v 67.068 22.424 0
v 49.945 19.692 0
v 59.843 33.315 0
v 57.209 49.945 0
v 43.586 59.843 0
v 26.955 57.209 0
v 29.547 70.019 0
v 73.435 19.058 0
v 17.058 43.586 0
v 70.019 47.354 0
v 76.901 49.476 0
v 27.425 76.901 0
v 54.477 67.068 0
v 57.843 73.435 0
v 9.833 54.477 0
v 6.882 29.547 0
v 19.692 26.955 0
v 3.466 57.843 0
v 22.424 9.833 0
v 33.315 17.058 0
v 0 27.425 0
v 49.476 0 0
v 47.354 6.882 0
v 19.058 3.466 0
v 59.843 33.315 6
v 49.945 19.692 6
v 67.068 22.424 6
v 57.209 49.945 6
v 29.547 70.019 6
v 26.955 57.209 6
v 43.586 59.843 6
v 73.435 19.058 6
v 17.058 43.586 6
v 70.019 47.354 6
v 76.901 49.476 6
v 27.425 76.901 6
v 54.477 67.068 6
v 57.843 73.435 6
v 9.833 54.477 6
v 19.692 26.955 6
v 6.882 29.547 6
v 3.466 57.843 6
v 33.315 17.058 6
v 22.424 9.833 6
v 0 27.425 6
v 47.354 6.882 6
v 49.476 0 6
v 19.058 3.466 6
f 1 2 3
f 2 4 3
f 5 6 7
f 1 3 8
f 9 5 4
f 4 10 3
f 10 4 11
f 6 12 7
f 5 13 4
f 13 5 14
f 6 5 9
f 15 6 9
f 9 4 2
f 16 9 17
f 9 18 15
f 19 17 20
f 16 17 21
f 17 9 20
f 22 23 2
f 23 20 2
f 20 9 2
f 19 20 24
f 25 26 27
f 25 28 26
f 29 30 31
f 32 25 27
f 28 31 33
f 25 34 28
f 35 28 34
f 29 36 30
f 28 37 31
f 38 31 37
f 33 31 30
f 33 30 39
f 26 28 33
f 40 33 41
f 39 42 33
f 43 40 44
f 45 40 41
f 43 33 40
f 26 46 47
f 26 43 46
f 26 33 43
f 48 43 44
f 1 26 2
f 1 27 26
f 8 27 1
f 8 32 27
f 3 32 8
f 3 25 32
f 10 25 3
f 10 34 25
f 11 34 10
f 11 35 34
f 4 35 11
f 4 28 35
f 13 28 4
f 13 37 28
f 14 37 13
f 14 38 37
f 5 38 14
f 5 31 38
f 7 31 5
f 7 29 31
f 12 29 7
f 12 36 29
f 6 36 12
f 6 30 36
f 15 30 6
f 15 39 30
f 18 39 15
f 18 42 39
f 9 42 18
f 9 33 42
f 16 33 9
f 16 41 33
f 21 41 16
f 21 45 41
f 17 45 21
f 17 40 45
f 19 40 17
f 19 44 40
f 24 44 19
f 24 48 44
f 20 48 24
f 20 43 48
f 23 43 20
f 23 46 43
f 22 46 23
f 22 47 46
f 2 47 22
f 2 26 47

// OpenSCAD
$fn = 32;

// ----------------------------------------------------------------------
// Fan rotor section: 8 blades, 22 mm hub radius, 18 mm blades
// ----------------------------------------------------------------------

// --- parameters (mm) ---
profile_height = 6;       // extrusion height
profile_points = 24;      // points of the closed outline

profile = [[59.843, 33.315], [70.019, 47.354], [76.901, 49.476], [57.209, 49.945], [54.477, 67.068], [57.843, 73.435], [43.586, 59.843], [29.547, 70.019], [27.425, 76.901], [26.955, 57.209], [9.833, 54.477], [3.466, 57.843], [17.058, 43.586], [6.882, 29.547], [0, 27.425], [19.692, 26.955], [22.424, 9.833], [19.058, 3.466], [33.315, 17.058], [47.354, 6.882], [49.476, 0], [49.945, 19.692], [67.068, 22.424], [73.435, 19.058]];  // single closed polygon, 24 points, counter clockwise

// --- the one profile operation ---
linear_extrude(height = profile_height) polygon(points = profile);
